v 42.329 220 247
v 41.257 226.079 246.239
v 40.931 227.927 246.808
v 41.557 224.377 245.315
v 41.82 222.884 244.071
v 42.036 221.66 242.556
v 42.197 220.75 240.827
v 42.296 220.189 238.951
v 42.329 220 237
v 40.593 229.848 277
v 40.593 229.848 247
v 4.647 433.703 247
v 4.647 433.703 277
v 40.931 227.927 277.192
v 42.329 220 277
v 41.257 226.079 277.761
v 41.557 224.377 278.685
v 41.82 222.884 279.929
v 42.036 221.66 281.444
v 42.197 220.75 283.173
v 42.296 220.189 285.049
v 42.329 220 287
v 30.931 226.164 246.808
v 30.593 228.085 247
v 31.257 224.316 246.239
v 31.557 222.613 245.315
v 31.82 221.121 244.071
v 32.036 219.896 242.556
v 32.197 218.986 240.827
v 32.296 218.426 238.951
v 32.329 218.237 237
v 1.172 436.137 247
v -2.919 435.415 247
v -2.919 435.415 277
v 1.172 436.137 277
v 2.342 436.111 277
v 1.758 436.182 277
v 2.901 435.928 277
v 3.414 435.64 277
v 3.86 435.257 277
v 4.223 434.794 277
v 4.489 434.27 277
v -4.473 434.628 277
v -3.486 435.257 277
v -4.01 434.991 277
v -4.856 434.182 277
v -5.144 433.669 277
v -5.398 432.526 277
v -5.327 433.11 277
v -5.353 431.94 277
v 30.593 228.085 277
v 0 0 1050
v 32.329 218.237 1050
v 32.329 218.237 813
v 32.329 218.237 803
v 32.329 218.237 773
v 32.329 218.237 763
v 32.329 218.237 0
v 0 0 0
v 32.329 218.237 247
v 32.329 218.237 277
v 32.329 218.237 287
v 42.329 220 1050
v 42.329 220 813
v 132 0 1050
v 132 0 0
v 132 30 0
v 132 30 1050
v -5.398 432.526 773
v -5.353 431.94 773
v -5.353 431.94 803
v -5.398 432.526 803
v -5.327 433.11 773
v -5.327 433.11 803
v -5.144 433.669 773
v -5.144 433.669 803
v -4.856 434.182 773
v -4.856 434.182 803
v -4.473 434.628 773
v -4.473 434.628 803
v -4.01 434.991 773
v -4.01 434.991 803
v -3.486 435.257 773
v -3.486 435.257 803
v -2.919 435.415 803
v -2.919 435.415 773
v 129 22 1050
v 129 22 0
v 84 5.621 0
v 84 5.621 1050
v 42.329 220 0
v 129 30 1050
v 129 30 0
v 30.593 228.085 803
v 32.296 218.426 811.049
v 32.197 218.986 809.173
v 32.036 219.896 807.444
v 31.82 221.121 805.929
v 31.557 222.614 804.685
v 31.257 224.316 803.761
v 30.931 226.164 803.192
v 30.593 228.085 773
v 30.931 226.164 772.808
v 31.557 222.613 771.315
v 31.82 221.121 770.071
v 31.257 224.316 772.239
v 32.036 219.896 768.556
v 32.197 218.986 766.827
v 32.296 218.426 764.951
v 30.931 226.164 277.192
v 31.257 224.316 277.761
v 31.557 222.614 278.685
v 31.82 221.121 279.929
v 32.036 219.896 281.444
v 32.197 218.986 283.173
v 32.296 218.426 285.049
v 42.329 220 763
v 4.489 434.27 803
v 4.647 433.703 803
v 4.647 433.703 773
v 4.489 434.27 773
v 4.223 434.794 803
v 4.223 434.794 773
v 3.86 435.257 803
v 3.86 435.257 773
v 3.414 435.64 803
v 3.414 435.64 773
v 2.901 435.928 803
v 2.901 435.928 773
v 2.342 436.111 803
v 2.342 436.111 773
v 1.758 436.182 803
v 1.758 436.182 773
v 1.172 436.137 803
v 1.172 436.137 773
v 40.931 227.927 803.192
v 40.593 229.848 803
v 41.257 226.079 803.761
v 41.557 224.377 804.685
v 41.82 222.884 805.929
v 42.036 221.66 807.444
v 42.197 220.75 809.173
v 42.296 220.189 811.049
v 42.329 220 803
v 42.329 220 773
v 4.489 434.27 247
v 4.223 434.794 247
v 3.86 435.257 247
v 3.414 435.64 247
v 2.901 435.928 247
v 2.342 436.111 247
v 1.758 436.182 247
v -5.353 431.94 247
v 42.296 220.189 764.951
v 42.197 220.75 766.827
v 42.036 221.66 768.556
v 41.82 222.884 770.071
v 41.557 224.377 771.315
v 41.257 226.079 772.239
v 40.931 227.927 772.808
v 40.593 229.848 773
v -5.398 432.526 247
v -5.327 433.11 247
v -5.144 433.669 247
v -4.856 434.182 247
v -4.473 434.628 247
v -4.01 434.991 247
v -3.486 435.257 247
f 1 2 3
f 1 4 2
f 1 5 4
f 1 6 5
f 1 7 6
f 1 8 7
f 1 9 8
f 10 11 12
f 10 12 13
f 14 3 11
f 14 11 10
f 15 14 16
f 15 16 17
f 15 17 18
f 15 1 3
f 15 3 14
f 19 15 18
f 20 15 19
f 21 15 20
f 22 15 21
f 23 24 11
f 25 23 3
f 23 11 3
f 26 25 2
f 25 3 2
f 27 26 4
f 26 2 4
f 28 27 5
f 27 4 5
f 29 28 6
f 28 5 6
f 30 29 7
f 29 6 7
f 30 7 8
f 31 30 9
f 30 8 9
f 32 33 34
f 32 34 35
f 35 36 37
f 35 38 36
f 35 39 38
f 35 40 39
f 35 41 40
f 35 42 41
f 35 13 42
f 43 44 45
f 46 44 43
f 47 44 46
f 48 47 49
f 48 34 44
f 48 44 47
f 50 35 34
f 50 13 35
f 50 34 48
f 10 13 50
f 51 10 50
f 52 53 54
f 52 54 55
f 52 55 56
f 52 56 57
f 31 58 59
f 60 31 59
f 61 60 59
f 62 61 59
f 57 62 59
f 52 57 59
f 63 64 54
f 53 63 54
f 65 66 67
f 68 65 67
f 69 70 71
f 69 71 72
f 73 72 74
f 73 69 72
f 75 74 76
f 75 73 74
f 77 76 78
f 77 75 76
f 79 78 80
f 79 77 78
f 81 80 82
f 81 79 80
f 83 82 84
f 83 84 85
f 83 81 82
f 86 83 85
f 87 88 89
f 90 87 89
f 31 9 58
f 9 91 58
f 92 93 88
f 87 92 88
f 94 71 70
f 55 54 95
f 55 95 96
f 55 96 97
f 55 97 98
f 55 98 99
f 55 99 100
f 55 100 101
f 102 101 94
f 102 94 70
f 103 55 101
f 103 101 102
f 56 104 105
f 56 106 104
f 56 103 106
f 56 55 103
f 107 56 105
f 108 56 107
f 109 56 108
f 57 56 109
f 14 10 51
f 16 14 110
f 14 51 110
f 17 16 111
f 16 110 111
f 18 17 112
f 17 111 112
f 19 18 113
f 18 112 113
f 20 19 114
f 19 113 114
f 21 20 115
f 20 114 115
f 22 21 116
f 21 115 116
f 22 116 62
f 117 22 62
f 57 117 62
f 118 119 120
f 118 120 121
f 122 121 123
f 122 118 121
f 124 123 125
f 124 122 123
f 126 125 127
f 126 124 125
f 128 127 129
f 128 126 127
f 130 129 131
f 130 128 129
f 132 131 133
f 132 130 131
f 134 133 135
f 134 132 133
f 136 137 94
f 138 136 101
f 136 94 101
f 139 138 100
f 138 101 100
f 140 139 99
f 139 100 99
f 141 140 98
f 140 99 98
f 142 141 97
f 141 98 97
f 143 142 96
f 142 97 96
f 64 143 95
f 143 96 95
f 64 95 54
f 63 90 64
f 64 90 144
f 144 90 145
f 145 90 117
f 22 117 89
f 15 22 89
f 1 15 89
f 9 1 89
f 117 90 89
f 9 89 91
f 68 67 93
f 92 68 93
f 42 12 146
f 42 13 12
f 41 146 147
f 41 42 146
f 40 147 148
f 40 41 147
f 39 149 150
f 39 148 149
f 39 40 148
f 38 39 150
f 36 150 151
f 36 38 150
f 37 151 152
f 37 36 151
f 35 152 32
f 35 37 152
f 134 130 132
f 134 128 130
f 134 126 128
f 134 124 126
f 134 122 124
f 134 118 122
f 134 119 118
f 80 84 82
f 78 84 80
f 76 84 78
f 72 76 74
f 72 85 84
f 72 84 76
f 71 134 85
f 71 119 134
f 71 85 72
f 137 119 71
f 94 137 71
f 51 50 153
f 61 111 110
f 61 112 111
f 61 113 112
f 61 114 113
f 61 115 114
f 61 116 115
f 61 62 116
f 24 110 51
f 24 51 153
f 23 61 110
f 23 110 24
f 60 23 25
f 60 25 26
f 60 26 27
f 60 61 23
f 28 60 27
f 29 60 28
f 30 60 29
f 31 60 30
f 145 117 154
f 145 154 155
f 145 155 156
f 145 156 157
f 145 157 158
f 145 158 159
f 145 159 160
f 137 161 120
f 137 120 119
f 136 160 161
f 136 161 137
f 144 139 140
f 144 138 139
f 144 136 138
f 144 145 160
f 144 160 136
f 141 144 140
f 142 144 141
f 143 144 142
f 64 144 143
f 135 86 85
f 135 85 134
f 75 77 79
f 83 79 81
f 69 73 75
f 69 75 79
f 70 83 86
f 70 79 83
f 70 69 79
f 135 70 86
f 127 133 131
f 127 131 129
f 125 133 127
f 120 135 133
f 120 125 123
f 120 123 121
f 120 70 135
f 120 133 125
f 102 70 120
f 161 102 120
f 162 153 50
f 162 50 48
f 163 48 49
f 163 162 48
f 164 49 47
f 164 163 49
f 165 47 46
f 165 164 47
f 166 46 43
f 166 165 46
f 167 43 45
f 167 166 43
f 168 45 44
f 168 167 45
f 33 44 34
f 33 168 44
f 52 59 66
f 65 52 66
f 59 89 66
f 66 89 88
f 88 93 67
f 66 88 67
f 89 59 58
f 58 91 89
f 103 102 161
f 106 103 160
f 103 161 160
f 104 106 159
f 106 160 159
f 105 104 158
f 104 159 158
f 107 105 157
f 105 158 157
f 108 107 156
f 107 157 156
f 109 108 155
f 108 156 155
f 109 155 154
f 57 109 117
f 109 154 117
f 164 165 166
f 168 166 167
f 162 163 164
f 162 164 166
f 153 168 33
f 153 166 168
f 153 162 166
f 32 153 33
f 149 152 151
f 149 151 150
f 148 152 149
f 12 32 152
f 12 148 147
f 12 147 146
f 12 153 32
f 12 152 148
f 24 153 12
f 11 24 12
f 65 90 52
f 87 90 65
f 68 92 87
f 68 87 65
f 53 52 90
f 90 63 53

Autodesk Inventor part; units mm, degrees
ref_plane "YZ Plane" through (0, 0, 0) normal (1, 0, 0) x (0, 1, 0)
ref_plane "XZ Plane" through (0, 0, 0) normal (0, 1, 0) x (-1, 0, 0)
ref_plane "XY Plane" through (0, 0, 0) normal (0, 0, 1) x (1, 0, 0)
sketch "Sketch1" plane through (0, 0, 0) normal (0, 0, 1) x (1, 0, 0)
  line L0 (0, 0) -> (132, 0)
  line L1 (132, 0) -> (132, 30)
  line L2 (132, 30) -> (129, 30)
  line L3 (42.329, 220) -> (32.329, 218.2367)
  line L4 (32.329, 218.2367) -> (0, 0)
  line L5 (129, 30) -> (129, 22)
  line L6 (129, 22) -> (84, 5.6213)
  line L7 (84, 5.6213) -> (114.3391, 5.6213) construction
  line L8 (84, 5.6213) -> (42.329, 220)
  dimension "d0" = 132
  dimension "d1" = 220
  dimension "d3" = 3
  dimension "d4" = 8
  dimension "d6" = 20
  dimension "d7" = 81
  dimension "d8" = 10
  dimension "d9" = 10
  dimension "d20" = 30
  dimension "d22" = 45
extrude "Extrusion1" add sketch "Sketch1" along normal blind 1050
sketch "Sketch2" plane through (32.329, 218.2367, 1050) normal (-0.1736482, 0.9848078, 0) x (0.9848078, 0.1736482, 0)
  line L0 (0, 277) -> (10.1543, 277)
  line L1 (10.1543, 277) -> (10.1543, 247)
  line L2 (10.1543, 247) -> (0, 247)
  line L3 (0, 247) -> (0, 277)
  line L4 (0, 1050) -> (0, 0) construction
  line L5 (0, 803) -> (10.1543, 803)
  line L6 (10.1543, 803) -> (10.1543, 773)
  line L7 (10.1543, 773) -> (0, 773)
  line L8 (0, 773) -> (0, 803)
  line L9 (13.9657, 1050) -> (0, 1050) construction
  line L10 (10.1543, 1050) -> (10.1543, 0) construction
  point P0 (-69.7343, 1050)
  dimension "d12" = 30
  dimension "d13" = 30
  dimension "d14" = 247
  dimension "d15" = 247
extrude "Extrusion2" add sketch "Sketch2" along normal blind 220
fillet "Fillet1" radius 3 4 edges at (4.1264, 436.6577, 788) (-5.8736, 434.8944, 788) (4.1264, 436.6577, 262) (-5.8736, 434.8944, 262)
fillet "Fillet2" radius 10 4 edges at (37.329, 219.1184, 803) (37.329, 219.1184, 277) (37.329, 219.1184, 773) (37.329, 219.1184, 247)
properties part number "sostenedor1"
